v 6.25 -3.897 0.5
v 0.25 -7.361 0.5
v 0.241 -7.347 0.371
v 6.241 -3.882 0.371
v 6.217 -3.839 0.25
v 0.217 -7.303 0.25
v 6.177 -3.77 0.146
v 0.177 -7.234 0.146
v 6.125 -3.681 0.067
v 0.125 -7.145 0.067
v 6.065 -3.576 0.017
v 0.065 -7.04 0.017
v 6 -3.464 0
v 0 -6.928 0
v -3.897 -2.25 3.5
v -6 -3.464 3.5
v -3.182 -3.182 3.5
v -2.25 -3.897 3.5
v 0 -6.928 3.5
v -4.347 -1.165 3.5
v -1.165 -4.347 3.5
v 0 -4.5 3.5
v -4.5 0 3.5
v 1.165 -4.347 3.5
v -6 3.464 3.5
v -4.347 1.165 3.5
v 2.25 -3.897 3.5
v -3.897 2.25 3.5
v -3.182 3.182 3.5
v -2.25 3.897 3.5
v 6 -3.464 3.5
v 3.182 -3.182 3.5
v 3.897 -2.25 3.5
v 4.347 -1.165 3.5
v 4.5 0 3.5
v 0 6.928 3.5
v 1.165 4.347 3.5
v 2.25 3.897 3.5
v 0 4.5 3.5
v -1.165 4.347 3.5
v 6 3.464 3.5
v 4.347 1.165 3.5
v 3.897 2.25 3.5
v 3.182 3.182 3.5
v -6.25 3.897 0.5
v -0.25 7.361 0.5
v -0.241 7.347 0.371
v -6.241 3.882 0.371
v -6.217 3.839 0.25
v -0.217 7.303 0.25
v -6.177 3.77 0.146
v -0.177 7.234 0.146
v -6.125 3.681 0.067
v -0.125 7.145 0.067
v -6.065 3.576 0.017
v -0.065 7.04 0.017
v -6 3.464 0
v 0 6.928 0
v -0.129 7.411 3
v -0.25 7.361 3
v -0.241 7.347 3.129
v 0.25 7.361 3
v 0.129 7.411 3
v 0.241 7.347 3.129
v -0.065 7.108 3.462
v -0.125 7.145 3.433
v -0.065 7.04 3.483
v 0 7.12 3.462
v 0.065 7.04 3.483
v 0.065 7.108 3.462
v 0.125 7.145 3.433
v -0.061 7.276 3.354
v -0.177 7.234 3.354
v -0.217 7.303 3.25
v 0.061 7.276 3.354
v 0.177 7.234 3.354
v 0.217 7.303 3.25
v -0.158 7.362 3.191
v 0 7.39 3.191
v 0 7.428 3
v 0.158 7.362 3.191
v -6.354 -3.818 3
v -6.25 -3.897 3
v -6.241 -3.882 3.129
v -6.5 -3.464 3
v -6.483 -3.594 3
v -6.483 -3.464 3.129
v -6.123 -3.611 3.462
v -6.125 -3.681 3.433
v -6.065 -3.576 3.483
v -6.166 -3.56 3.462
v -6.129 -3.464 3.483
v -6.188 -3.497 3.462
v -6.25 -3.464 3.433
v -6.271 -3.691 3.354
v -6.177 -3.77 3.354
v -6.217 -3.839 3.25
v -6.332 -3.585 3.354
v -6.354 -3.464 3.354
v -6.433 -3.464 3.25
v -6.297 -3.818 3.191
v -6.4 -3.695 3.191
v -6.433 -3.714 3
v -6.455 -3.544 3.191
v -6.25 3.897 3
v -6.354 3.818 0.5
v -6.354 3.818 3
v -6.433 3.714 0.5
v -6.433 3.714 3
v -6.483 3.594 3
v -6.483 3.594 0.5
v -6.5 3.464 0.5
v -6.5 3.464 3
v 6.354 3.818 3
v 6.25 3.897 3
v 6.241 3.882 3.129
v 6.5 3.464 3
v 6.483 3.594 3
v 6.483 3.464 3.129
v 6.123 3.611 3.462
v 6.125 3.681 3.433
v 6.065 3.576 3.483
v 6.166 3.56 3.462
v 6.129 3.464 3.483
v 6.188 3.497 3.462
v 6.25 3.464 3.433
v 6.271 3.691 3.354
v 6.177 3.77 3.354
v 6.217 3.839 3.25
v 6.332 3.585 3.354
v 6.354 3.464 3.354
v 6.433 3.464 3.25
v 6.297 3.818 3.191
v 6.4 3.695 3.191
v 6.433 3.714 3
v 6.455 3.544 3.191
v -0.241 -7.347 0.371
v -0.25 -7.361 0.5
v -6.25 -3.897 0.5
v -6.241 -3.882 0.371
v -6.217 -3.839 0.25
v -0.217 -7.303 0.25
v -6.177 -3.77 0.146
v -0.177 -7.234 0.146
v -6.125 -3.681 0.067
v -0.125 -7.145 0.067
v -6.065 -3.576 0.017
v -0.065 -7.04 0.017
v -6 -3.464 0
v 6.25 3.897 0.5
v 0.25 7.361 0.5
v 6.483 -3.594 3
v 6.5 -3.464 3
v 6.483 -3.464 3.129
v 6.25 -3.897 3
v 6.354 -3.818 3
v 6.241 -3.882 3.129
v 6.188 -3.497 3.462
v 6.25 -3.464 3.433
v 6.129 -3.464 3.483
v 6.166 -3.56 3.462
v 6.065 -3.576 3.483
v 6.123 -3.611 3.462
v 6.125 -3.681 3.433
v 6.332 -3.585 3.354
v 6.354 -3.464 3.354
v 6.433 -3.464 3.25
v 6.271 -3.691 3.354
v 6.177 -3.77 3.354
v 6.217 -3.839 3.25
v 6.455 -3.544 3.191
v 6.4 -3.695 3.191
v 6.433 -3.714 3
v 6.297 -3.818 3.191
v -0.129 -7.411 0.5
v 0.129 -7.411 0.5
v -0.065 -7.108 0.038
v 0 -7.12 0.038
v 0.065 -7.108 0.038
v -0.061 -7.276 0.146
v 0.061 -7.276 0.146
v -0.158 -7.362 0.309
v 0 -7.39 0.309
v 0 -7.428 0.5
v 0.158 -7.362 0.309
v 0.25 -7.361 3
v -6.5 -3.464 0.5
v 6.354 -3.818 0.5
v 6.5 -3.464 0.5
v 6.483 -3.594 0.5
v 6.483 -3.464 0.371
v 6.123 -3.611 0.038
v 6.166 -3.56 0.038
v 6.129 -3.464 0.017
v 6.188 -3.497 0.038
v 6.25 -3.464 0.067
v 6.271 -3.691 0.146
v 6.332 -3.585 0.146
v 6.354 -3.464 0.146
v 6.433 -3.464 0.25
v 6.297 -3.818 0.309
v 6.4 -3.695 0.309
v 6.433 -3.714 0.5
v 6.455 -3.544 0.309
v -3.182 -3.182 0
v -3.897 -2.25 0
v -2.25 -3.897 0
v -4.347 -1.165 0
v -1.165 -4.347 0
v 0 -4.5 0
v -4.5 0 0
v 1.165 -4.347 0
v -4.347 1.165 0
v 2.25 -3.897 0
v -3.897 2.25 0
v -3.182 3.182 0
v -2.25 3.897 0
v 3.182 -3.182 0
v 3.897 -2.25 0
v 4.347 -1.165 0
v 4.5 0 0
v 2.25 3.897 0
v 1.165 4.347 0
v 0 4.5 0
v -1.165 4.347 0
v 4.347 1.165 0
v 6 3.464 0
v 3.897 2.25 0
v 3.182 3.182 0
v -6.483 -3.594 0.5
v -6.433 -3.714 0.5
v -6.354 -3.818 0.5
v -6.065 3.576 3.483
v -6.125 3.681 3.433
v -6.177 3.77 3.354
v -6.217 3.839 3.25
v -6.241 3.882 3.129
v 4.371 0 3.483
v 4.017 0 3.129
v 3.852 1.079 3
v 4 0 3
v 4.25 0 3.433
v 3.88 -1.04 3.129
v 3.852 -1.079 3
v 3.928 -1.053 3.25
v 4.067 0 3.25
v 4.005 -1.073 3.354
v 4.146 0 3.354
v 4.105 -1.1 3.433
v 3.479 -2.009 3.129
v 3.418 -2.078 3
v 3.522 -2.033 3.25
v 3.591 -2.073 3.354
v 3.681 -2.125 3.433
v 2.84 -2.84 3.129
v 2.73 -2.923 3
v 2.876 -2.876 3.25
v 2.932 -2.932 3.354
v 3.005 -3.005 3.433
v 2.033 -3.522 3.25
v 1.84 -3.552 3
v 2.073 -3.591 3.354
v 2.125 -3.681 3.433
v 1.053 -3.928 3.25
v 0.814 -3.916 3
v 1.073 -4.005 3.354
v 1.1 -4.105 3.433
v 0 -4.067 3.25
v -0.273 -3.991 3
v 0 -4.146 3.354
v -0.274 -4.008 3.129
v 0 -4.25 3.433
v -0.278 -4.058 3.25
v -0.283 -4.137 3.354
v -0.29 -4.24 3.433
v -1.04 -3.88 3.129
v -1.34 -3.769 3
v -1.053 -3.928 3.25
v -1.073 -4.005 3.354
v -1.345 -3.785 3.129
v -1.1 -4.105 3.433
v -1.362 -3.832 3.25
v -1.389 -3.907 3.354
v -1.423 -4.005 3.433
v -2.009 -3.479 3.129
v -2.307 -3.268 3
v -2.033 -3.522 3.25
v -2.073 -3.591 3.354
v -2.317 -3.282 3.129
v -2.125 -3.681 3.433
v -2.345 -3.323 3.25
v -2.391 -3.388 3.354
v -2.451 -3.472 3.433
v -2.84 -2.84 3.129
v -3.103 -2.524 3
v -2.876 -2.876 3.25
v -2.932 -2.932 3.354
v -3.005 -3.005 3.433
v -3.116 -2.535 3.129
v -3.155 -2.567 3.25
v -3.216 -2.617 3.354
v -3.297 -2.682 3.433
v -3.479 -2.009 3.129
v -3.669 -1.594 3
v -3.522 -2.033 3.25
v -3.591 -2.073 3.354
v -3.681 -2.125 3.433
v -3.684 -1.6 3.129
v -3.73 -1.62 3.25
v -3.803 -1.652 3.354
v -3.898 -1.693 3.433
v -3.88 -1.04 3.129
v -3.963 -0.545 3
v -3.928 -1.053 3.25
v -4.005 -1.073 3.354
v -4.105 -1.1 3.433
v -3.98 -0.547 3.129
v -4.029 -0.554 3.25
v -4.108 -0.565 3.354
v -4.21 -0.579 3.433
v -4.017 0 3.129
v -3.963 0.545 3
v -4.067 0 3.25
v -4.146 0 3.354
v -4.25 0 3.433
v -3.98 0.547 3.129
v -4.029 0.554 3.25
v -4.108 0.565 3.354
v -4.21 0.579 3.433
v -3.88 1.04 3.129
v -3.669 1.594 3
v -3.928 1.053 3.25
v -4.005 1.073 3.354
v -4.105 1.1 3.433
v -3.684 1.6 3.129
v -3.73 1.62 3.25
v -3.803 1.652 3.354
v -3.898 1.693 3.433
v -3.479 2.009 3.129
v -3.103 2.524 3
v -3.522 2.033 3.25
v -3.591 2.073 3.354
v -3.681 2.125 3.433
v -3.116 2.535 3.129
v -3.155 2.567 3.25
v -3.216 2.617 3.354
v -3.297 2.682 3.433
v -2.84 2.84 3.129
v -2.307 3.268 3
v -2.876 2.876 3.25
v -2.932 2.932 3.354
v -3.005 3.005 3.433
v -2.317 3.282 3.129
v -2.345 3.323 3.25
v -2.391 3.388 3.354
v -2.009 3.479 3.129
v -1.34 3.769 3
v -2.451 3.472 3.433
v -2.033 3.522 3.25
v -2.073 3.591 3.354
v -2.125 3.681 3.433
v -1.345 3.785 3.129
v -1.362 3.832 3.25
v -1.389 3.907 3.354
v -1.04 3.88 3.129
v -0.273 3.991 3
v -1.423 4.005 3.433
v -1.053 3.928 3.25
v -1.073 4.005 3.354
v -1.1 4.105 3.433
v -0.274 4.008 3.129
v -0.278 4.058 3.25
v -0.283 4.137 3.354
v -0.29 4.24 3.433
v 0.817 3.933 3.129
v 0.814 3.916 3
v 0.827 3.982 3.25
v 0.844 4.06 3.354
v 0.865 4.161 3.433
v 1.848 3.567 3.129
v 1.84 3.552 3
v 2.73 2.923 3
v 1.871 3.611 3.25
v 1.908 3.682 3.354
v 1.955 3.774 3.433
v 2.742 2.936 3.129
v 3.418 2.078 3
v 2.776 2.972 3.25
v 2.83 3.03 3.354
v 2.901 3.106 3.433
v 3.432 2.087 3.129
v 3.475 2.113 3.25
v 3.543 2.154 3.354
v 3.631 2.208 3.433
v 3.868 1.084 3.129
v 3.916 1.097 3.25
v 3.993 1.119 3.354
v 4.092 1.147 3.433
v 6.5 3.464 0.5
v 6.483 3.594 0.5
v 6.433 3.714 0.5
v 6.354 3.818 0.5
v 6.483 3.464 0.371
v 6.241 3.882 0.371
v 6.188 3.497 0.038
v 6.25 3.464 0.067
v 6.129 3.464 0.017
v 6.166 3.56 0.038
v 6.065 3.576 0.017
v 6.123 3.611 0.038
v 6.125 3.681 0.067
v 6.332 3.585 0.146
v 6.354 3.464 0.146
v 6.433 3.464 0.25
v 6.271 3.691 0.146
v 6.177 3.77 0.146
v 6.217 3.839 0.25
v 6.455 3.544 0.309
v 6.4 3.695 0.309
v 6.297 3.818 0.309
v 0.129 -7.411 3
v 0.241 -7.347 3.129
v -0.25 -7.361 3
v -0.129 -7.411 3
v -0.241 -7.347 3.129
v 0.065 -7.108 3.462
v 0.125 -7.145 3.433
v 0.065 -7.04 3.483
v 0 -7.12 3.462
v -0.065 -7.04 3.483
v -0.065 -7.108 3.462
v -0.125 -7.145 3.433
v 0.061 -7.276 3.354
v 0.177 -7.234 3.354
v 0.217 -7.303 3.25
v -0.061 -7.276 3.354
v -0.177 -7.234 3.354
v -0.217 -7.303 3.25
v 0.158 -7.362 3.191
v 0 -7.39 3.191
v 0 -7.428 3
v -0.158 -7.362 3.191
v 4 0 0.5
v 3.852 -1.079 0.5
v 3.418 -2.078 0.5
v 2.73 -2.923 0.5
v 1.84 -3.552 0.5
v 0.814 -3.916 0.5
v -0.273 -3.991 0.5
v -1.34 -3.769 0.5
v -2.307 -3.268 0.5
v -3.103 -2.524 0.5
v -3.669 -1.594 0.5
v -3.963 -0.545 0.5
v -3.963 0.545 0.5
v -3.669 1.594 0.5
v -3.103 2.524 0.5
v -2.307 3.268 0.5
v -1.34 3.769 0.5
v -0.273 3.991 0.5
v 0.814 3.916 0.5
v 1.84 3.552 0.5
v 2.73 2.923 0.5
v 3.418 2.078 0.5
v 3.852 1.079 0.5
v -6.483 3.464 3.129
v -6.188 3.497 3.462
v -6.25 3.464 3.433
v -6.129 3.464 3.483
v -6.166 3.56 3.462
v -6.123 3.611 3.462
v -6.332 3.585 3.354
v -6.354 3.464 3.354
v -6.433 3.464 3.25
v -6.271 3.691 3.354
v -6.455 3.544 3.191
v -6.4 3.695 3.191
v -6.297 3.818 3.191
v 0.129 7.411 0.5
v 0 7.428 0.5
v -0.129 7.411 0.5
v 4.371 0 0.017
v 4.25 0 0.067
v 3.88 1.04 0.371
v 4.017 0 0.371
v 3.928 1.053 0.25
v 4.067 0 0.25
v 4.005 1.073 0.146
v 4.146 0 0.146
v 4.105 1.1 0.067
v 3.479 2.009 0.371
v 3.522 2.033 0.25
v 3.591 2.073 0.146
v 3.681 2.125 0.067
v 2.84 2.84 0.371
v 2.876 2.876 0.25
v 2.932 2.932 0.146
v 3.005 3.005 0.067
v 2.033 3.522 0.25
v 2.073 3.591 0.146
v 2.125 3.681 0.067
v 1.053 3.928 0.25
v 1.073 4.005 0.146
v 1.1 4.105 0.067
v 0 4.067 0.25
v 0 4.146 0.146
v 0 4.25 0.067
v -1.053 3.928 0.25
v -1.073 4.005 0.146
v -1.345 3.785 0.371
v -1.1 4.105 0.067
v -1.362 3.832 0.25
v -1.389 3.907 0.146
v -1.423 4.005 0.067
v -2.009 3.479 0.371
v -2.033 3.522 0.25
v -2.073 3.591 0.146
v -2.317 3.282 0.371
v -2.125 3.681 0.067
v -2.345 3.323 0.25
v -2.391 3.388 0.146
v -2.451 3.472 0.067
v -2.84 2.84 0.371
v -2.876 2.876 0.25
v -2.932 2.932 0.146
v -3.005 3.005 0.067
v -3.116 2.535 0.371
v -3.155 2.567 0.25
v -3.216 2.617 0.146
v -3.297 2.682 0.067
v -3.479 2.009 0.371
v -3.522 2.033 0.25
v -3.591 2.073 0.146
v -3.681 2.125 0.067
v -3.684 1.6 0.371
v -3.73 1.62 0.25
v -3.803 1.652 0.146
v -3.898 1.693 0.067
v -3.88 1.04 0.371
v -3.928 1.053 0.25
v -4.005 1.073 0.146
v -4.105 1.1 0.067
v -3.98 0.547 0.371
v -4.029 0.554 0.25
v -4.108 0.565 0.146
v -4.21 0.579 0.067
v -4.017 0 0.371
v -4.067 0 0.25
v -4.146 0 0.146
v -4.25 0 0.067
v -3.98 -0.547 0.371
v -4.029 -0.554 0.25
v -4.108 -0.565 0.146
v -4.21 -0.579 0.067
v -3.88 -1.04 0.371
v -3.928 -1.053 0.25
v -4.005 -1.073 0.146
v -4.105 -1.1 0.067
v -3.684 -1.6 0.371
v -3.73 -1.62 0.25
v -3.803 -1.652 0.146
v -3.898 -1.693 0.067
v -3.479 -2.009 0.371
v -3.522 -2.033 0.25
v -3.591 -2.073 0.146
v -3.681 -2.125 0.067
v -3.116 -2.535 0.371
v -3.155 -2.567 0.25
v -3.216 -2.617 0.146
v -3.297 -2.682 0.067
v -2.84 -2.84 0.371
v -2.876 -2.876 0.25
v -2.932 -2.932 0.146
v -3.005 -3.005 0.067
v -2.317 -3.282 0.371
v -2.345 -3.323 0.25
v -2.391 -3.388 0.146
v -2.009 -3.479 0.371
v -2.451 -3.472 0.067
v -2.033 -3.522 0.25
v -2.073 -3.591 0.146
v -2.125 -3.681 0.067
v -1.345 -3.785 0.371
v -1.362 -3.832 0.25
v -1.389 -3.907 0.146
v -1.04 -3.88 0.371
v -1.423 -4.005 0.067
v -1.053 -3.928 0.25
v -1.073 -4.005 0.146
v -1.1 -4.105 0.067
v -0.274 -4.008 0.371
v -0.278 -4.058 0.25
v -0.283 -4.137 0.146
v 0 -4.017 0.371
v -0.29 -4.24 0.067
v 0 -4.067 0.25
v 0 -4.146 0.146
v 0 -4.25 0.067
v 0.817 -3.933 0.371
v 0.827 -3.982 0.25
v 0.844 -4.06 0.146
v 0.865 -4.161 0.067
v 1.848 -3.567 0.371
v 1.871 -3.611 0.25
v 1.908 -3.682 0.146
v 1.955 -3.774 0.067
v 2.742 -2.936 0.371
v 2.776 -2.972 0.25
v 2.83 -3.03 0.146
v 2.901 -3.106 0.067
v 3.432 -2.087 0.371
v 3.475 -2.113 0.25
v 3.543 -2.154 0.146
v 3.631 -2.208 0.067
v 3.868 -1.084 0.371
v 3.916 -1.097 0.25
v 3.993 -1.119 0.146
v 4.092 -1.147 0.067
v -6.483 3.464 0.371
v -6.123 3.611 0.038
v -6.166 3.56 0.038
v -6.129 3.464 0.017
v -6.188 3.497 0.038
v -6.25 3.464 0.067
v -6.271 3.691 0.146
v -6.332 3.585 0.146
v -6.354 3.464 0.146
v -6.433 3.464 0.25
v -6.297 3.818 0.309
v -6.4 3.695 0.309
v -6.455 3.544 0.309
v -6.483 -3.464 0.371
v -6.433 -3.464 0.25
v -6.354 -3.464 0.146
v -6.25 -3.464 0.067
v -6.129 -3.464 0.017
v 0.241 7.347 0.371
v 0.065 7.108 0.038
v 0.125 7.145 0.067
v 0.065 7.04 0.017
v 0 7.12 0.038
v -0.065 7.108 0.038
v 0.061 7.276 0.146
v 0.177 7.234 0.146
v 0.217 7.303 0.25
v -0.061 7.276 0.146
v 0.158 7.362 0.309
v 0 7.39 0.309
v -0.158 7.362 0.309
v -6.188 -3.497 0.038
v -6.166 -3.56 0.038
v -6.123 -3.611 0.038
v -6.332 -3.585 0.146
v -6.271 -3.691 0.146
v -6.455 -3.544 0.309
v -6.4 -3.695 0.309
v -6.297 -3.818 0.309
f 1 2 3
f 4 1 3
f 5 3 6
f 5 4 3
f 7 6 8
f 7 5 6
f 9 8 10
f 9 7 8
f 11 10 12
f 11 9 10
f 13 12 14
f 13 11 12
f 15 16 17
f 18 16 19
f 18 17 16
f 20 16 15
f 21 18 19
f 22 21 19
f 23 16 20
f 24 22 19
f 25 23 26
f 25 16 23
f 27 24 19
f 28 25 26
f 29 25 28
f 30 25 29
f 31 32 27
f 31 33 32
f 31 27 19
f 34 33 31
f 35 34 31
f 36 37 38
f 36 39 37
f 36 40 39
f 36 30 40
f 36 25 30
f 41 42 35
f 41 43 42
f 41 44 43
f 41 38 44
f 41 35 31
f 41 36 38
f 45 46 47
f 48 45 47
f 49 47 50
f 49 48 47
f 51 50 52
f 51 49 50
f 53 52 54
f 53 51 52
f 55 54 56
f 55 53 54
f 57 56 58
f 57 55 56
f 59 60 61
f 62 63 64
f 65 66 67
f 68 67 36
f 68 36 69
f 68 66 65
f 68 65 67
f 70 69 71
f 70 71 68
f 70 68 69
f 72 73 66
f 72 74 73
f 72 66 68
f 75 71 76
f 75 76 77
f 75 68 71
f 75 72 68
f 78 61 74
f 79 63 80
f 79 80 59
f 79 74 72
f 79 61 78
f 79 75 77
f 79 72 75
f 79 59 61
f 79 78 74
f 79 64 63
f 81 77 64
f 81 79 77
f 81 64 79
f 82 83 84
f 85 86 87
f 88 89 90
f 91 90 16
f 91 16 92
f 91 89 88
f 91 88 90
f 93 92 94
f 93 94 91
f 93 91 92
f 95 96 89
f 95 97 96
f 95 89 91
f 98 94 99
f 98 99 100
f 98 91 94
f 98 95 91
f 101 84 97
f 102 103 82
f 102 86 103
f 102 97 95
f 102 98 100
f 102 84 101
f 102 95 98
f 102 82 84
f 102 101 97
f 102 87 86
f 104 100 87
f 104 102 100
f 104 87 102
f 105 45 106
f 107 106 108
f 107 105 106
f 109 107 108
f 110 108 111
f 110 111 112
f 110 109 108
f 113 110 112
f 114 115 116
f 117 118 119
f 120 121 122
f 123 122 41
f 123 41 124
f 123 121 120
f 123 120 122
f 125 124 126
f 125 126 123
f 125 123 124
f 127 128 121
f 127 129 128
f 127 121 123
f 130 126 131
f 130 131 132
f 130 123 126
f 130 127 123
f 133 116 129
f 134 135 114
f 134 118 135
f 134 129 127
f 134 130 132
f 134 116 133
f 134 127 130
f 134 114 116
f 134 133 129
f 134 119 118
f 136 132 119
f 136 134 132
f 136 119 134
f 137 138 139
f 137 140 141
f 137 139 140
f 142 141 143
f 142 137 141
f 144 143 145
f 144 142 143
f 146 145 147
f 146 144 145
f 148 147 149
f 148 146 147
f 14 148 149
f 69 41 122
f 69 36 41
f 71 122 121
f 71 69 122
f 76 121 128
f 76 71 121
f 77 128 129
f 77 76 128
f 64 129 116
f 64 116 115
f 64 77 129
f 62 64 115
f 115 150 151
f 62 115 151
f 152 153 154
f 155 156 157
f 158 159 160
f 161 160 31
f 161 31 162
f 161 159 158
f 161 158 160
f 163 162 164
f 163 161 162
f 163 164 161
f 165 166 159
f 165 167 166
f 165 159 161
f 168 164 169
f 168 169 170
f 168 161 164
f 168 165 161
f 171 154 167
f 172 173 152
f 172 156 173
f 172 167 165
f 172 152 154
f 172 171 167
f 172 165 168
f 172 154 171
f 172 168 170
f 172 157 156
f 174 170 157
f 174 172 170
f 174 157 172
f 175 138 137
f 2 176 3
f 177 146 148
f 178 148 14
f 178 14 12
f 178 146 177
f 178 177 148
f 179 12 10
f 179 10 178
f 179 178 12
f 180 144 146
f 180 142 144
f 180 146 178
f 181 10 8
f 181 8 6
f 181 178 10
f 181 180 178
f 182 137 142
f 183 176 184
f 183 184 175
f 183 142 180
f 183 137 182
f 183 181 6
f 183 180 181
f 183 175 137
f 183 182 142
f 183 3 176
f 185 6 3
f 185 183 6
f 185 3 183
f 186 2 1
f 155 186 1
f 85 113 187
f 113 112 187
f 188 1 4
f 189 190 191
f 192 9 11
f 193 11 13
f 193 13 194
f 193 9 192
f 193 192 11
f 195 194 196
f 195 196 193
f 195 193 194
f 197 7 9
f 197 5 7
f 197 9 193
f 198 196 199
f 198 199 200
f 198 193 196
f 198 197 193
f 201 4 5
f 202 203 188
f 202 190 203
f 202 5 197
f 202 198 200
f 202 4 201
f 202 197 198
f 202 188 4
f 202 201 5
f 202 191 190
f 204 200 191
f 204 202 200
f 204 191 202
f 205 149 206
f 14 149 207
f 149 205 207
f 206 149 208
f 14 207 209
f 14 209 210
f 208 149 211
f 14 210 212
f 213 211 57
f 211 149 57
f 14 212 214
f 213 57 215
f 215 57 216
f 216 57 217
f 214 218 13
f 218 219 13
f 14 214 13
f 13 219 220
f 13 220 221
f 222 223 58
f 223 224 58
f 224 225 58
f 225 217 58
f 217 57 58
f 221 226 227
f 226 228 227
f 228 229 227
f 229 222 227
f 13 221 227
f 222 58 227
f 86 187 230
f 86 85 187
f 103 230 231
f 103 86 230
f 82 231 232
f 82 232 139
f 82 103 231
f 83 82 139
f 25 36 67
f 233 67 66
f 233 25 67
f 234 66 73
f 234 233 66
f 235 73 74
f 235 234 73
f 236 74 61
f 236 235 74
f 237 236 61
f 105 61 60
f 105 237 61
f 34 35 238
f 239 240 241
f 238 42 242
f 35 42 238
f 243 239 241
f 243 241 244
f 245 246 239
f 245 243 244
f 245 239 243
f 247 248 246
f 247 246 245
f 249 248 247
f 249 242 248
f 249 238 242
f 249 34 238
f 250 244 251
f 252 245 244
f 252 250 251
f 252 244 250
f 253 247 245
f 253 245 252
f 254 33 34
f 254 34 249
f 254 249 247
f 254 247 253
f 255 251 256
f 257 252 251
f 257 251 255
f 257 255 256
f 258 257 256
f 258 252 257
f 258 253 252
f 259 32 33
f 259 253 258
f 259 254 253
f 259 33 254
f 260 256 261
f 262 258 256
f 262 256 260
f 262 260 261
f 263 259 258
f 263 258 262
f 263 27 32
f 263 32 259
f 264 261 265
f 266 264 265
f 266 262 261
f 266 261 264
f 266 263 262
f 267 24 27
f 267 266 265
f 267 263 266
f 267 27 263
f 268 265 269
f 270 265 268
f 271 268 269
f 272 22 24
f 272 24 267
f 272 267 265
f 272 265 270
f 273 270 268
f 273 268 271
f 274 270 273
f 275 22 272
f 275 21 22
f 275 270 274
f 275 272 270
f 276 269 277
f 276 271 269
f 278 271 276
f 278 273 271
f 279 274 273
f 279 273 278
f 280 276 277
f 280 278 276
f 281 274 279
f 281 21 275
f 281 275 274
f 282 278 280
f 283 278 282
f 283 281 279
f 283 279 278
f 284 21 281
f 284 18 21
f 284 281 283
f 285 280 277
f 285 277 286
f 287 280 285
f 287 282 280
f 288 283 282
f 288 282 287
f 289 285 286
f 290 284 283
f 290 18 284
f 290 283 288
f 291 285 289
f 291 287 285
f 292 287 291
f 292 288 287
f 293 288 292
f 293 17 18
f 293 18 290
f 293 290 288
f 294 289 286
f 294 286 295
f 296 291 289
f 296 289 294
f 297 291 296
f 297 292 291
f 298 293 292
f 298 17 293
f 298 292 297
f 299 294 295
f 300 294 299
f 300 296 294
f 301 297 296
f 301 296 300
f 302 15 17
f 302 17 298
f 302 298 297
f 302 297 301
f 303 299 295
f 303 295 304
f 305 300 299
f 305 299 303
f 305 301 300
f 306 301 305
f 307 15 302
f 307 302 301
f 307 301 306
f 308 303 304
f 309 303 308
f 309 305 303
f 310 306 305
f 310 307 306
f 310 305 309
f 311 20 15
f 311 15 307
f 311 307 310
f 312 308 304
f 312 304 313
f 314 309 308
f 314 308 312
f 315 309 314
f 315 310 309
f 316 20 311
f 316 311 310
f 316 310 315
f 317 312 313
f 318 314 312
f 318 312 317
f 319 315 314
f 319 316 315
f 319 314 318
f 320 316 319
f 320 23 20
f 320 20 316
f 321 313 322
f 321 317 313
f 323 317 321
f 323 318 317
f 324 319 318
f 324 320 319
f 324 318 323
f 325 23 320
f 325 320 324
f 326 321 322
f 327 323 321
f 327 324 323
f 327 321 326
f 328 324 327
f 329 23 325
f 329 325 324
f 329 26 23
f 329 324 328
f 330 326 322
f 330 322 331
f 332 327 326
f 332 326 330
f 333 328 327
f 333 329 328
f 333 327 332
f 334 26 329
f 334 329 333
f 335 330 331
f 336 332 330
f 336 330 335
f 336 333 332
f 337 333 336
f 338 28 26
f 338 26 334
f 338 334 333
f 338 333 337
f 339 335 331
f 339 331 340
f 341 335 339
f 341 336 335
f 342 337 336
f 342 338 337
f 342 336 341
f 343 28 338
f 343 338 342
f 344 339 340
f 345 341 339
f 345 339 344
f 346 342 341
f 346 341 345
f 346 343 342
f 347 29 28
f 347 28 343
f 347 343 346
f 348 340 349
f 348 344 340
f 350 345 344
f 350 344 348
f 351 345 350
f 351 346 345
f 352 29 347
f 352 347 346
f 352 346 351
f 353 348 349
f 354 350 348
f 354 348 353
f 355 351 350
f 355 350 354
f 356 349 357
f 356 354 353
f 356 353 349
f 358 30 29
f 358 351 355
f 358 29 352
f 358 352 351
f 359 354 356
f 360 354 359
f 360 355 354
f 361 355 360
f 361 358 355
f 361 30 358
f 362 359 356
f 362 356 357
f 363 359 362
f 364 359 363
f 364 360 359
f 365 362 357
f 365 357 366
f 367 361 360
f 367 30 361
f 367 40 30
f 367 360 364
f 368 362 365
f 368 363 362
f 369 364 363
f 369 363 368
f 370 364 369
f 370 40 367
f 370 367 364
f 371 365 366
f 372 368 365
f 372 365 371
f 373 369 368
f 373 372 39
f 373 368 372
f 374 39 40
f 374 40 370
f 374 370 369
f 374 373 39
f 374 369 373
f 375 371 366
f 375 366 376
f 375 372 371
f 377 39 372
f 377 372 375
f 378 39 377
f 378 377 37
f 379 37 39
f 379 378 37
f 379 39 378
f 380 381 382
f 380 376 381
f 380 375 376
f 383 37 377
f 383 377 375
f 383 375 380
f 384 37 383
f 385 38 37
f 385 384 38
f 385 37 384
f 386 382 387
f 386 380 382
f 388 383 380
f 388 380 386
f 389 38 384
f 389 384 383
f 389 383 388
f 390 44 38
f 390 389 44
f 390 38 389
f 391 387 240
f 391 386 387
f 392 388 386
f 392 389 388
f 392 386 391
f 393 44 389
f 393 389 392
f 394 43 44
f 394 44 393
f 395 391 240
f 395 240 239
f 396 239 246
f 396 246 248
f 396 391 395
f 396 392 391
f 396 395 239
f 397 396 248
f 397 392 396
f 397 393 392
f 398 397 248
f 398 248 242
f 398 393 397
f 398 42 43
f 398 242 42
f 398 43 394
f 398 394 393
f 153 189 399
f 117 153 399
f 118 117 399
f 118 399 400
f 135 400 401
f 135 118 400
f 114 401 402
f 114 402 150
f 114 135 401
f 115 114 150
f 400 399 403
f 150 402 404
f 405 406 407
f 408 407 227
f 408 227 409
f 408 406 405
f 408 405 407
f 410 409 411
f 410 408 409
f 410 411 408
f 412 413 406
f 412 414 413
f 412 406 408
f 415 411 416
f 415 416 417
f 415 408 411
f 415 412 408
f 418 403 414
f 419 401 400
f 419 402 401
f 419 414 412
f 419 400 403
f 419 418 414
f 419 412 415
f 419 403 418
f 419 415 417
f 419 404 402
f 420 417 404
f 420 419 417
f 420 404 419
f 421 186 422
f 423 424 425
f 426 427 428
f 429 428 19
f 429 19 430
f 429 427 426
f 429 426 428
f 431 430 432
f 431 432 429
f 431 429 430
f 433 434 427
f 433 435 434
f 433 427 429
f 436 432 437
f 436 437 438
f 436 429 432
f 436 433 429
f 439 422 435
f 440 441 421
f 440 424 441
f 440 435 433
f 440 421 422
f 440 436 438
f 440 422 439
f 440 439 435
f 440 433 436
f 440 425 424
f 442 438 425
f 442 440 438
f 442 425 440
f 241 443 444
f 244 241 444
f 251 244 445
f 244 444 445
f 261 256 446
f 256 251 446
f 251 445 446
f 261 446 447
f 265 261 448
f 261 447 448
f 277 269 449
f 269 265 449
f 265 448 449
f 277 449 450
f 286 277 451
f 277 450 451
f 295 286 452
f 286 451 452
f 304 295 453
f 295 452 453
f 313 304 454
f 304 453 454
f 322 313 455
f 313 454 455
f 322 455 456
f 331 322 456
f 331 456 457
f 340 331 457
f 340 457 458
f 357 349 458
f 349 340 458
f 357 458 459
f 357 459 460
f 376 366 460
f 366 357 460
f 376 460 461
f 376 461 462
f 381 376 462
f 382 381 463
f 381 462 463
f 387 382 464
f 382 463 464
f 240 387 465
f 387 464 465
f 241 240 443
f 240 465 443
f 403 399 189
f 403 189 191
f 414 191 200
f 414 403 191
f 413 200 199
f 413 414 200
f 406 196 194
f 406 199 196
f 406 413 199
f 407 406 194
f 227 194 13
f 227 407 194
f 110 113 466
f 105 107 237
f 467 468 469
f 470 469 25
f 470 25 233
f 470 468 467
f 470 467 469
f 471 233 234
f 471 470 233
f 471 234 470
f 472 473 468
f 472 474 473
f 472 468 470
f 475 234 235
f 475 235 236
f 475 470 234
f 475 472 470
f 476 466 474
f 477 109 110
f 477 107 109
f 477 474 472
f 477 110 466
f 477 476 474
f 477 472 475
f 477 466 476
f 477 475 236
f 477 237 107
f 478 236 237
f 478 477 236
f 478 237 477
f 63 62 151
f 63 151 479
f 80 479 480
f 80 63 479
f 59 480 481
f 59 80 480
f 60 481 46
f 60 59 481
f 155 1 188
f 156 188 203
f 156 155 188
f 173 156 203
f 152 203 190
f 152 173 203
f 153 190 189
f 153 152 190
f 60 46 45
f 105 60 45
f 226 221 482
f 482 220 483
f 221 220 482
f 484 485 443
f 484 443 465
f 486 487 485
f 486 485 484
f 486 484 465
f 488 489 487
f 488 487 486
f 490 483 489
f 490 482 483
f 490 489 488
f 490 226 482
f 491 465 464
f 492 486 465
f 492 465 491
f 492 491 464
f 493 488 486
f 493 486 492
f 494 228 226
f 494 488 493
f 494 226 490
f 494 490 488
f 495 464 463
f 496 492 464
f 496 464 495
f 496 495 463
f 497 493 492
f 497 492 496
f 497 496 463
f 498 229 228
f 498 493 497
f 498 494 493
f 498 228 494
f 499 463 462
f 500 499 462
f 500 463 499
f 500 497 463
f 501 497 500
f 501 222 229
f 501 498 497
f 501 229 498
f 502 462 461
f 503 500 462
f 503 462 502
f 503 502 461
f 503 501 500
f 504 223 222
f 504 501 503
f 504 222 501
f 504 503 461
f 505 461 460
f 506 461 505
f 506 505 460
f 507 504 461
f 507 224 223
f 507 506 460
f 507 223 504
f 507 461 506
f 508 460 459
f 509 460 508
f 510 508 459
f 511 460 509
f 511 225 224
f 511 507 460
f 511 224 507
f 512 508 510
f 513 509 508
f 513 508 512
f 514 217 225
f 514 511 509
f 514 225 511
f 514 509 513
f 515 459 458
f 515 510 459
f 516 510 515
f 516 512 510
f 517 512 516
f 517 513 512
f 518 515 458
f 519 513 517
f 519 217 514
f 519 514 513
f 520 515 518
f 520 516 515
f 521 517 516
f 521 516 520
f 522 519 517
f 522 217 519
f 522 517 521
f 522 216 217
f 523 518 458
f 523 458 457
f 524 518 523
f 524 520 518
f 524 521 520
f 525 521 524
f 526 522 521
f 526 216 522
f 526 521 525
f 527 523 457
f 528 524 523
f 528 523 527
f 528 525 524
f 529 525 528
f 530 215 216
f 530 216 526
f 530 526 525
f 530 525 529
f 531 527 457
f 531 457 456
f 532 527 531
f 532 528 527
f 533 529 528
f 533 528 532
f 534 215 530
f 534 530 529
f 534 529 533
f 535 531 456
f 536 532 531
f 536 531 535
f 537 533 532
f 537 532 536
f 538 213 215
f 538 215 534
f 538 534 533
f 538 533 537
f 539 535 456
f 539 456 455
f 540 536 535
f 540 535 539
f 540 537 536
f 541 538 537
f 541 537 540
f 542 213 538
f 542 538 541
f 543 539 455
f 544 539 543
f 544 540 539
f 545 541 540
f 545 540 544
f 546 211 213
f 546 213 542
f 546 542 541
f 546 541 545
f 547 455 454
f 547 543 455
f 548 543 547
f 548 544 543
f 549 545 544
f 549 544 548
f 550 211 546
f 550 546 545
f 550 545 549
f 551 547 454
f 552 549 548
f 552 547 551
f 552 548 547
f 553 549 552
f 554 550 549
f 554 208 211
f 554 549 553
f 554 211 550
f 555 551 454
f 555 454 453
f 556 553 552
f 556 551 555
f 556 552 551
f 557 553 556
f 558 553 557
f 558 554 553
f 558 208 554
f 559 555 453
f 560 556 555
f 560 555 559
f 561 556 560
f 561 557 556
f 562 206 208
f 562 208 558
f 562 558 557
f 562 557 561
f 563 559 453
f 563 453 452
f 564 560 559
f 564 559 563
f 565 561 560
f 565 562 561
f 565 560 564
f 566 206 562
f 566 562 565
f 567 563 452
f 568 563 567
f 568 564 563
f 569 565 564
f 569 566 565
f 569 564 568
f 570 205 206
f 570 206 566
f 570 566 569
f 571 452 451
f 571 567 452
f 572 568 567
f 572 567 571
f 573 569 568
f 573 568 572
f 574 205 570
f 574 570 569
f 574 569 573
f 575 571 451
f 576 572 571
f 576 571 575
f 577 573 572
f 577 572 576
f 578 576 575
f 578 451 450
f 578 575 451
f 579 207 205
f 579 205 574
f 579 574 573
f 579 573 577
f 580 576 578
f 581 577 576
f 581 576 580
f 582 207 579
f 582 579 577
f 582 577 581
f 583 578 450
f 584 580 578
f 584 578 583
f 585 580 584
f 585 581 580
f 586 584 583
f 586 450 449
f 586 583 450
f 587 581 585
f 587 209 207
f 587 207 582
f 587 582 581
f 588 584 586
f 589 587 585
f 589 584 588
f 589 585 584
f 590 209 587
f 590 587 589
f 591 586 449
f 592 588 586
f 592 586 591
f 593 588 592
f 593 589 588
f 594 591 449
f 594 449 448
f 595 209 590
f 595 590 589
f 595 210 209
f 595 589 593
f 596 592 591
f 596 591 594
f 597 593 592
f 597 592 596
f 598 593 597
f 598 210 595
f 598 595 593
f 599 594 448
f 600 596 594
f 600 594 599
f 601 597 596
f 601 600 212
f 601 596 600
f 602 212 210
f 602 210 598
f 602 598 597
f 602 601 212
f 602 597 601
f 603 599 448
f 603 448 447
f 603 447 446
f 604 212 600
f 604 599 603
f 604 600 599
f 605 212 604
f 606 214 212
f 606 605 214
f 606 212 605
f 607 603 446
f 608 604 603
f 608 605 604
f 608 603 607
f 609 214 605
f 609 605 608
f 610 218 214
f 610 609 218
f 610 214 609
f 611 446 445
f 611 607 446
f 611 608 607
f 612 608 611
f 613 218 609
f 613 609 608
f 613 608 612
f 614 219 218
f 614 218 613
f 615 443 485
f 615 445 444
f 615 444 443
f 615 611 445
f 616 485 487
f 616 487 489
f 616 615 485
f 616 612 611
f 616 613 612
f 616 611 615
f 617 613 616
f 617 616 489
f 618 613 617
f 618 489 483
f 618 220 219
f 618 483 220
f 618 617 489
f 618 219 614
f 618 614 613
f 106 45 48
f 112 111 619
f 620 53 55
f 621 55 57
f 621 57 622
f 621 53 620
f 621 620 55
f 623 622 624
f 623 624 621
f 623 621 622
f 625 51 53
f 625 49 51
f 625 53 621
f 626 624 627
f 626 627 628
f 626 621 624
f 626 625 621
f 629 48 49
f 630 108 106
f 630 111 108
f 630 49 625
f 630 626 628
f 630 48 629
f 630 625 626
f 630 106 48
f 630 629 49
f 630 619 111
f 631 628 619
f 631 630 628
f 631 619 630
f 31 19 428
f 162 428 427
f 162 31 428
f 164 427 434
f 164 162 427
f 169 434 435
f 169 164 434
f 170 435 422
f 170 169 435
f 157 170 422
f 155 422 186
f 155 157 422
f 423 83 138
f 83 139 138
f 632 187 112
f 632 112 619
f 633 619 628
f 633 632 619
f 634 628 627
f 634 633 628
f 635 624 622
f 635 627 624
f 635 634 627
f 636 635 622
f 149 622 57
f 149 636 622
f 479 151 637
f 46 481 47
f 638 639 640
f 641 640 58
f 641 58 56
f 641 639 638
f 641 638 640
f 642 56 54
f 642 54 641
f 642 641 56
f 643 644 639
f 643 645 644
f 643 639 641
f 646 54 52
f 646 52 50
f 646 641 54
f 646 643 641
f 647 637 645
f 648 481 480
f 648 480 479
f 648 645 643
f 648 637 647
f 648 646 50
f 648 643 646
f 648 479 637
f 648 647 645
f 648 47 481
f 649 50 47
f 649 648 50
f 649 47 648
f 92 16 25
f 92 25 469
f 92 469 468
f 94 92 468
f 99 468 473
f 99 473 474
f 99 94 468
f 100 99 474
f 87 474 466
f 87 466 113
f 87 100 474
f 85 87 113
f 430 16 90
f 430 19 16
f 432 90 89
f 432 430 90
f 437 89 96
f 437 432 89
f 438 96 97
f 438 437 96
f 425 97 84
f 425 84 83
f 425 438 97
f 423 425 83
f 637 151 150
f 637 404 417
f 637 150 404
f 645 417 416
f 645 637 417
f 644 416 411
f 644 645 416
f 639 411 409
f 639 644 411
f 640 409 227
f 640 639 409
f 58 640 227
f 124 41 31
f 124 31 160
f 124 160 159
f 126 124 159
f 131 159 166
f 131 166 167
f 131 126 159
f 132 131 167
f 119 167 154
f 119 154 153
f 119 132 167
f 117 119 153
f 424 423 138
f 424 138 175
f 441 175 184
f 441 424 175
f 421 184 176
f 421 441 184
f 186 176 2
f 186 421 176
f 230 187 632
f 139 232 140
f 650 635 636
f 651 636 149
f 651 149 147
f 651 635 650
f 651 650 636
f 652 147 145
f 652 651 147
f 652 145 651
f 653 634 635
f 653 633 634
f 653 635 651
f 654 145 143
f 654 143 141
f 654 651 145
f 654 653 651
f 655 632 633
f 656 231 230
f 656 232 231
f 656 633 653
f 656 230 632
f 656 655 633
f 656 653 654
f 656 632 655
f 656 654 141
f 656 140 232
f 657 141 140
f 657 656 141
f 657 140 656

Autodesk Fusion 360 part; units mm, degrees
sketch "Sketch1" plane through (0, 0, 0) normal (0, 0, 1) x (1, 0, 0)
  circle A0 centre (0, 0) radius 4
  line L0 (0, -7.5056) -> (6.5, -3.7528)
  line L1 (6.5, -3.7528) -> (6.5, 3.7528)
  line L2 (6.5, 3.7528) -> (0, 7.5056)
  line L3 (0, 7.5056) -> (-6.5, 3.7528)
  line L4 (-6.5, 3.7528) -> (-6.5, -3.7528)
  line L5 (-6.5, -3.7528) -> (0, -7.5056)
  dimension "d1" = 8
  dimension "d2" = 13
extrude "Extrude1" add sketch "Sketch1" along normal blind 3.5
fillet "Fillet1" radius 0.5 20 edges at (-3.7293, 1.4465, 0) (-6.5, -3.7528, 1.75) (3.25, 5.6292, 0) (-3.25, 5.6292, 3.5) (3.25, -5.6292, 3.5) (6.5, 3.7528, 1.75) (6.5, 0, 0) (-6.5, 0, 0) (-6.5, 3.7528, 1.75) (6.5, -3.7528, 1.75) (-3.25, -5.6292, 3.5) (-6.5, 0, 3.5) (3.25, -5.6292, 0) (-3.25, -5.6292, 0) (-3.7293, 1.4465, 3.5) (0, 7.5056, 1.75) (0, -7.5056, 1.75) (3.25, 5.6292, 3.5) (6.5, 0, 3.5) (-3.25, 5.6292, 0) 9 faces at (-6.5, 1.2509, 1.1667) (6.5, -1.2509, 1.1667) (-2.1667, 6.2546, 1.1667) (2.1667, -6.2546, 1.1667) (3.9801, -0.3983, 2.3333) (-4.3333, -5.0037, 1.1667) (5.6667, 0, 3.5) (5.6667, 0, 0) (4.3333, 5.0037, 1.1667)
